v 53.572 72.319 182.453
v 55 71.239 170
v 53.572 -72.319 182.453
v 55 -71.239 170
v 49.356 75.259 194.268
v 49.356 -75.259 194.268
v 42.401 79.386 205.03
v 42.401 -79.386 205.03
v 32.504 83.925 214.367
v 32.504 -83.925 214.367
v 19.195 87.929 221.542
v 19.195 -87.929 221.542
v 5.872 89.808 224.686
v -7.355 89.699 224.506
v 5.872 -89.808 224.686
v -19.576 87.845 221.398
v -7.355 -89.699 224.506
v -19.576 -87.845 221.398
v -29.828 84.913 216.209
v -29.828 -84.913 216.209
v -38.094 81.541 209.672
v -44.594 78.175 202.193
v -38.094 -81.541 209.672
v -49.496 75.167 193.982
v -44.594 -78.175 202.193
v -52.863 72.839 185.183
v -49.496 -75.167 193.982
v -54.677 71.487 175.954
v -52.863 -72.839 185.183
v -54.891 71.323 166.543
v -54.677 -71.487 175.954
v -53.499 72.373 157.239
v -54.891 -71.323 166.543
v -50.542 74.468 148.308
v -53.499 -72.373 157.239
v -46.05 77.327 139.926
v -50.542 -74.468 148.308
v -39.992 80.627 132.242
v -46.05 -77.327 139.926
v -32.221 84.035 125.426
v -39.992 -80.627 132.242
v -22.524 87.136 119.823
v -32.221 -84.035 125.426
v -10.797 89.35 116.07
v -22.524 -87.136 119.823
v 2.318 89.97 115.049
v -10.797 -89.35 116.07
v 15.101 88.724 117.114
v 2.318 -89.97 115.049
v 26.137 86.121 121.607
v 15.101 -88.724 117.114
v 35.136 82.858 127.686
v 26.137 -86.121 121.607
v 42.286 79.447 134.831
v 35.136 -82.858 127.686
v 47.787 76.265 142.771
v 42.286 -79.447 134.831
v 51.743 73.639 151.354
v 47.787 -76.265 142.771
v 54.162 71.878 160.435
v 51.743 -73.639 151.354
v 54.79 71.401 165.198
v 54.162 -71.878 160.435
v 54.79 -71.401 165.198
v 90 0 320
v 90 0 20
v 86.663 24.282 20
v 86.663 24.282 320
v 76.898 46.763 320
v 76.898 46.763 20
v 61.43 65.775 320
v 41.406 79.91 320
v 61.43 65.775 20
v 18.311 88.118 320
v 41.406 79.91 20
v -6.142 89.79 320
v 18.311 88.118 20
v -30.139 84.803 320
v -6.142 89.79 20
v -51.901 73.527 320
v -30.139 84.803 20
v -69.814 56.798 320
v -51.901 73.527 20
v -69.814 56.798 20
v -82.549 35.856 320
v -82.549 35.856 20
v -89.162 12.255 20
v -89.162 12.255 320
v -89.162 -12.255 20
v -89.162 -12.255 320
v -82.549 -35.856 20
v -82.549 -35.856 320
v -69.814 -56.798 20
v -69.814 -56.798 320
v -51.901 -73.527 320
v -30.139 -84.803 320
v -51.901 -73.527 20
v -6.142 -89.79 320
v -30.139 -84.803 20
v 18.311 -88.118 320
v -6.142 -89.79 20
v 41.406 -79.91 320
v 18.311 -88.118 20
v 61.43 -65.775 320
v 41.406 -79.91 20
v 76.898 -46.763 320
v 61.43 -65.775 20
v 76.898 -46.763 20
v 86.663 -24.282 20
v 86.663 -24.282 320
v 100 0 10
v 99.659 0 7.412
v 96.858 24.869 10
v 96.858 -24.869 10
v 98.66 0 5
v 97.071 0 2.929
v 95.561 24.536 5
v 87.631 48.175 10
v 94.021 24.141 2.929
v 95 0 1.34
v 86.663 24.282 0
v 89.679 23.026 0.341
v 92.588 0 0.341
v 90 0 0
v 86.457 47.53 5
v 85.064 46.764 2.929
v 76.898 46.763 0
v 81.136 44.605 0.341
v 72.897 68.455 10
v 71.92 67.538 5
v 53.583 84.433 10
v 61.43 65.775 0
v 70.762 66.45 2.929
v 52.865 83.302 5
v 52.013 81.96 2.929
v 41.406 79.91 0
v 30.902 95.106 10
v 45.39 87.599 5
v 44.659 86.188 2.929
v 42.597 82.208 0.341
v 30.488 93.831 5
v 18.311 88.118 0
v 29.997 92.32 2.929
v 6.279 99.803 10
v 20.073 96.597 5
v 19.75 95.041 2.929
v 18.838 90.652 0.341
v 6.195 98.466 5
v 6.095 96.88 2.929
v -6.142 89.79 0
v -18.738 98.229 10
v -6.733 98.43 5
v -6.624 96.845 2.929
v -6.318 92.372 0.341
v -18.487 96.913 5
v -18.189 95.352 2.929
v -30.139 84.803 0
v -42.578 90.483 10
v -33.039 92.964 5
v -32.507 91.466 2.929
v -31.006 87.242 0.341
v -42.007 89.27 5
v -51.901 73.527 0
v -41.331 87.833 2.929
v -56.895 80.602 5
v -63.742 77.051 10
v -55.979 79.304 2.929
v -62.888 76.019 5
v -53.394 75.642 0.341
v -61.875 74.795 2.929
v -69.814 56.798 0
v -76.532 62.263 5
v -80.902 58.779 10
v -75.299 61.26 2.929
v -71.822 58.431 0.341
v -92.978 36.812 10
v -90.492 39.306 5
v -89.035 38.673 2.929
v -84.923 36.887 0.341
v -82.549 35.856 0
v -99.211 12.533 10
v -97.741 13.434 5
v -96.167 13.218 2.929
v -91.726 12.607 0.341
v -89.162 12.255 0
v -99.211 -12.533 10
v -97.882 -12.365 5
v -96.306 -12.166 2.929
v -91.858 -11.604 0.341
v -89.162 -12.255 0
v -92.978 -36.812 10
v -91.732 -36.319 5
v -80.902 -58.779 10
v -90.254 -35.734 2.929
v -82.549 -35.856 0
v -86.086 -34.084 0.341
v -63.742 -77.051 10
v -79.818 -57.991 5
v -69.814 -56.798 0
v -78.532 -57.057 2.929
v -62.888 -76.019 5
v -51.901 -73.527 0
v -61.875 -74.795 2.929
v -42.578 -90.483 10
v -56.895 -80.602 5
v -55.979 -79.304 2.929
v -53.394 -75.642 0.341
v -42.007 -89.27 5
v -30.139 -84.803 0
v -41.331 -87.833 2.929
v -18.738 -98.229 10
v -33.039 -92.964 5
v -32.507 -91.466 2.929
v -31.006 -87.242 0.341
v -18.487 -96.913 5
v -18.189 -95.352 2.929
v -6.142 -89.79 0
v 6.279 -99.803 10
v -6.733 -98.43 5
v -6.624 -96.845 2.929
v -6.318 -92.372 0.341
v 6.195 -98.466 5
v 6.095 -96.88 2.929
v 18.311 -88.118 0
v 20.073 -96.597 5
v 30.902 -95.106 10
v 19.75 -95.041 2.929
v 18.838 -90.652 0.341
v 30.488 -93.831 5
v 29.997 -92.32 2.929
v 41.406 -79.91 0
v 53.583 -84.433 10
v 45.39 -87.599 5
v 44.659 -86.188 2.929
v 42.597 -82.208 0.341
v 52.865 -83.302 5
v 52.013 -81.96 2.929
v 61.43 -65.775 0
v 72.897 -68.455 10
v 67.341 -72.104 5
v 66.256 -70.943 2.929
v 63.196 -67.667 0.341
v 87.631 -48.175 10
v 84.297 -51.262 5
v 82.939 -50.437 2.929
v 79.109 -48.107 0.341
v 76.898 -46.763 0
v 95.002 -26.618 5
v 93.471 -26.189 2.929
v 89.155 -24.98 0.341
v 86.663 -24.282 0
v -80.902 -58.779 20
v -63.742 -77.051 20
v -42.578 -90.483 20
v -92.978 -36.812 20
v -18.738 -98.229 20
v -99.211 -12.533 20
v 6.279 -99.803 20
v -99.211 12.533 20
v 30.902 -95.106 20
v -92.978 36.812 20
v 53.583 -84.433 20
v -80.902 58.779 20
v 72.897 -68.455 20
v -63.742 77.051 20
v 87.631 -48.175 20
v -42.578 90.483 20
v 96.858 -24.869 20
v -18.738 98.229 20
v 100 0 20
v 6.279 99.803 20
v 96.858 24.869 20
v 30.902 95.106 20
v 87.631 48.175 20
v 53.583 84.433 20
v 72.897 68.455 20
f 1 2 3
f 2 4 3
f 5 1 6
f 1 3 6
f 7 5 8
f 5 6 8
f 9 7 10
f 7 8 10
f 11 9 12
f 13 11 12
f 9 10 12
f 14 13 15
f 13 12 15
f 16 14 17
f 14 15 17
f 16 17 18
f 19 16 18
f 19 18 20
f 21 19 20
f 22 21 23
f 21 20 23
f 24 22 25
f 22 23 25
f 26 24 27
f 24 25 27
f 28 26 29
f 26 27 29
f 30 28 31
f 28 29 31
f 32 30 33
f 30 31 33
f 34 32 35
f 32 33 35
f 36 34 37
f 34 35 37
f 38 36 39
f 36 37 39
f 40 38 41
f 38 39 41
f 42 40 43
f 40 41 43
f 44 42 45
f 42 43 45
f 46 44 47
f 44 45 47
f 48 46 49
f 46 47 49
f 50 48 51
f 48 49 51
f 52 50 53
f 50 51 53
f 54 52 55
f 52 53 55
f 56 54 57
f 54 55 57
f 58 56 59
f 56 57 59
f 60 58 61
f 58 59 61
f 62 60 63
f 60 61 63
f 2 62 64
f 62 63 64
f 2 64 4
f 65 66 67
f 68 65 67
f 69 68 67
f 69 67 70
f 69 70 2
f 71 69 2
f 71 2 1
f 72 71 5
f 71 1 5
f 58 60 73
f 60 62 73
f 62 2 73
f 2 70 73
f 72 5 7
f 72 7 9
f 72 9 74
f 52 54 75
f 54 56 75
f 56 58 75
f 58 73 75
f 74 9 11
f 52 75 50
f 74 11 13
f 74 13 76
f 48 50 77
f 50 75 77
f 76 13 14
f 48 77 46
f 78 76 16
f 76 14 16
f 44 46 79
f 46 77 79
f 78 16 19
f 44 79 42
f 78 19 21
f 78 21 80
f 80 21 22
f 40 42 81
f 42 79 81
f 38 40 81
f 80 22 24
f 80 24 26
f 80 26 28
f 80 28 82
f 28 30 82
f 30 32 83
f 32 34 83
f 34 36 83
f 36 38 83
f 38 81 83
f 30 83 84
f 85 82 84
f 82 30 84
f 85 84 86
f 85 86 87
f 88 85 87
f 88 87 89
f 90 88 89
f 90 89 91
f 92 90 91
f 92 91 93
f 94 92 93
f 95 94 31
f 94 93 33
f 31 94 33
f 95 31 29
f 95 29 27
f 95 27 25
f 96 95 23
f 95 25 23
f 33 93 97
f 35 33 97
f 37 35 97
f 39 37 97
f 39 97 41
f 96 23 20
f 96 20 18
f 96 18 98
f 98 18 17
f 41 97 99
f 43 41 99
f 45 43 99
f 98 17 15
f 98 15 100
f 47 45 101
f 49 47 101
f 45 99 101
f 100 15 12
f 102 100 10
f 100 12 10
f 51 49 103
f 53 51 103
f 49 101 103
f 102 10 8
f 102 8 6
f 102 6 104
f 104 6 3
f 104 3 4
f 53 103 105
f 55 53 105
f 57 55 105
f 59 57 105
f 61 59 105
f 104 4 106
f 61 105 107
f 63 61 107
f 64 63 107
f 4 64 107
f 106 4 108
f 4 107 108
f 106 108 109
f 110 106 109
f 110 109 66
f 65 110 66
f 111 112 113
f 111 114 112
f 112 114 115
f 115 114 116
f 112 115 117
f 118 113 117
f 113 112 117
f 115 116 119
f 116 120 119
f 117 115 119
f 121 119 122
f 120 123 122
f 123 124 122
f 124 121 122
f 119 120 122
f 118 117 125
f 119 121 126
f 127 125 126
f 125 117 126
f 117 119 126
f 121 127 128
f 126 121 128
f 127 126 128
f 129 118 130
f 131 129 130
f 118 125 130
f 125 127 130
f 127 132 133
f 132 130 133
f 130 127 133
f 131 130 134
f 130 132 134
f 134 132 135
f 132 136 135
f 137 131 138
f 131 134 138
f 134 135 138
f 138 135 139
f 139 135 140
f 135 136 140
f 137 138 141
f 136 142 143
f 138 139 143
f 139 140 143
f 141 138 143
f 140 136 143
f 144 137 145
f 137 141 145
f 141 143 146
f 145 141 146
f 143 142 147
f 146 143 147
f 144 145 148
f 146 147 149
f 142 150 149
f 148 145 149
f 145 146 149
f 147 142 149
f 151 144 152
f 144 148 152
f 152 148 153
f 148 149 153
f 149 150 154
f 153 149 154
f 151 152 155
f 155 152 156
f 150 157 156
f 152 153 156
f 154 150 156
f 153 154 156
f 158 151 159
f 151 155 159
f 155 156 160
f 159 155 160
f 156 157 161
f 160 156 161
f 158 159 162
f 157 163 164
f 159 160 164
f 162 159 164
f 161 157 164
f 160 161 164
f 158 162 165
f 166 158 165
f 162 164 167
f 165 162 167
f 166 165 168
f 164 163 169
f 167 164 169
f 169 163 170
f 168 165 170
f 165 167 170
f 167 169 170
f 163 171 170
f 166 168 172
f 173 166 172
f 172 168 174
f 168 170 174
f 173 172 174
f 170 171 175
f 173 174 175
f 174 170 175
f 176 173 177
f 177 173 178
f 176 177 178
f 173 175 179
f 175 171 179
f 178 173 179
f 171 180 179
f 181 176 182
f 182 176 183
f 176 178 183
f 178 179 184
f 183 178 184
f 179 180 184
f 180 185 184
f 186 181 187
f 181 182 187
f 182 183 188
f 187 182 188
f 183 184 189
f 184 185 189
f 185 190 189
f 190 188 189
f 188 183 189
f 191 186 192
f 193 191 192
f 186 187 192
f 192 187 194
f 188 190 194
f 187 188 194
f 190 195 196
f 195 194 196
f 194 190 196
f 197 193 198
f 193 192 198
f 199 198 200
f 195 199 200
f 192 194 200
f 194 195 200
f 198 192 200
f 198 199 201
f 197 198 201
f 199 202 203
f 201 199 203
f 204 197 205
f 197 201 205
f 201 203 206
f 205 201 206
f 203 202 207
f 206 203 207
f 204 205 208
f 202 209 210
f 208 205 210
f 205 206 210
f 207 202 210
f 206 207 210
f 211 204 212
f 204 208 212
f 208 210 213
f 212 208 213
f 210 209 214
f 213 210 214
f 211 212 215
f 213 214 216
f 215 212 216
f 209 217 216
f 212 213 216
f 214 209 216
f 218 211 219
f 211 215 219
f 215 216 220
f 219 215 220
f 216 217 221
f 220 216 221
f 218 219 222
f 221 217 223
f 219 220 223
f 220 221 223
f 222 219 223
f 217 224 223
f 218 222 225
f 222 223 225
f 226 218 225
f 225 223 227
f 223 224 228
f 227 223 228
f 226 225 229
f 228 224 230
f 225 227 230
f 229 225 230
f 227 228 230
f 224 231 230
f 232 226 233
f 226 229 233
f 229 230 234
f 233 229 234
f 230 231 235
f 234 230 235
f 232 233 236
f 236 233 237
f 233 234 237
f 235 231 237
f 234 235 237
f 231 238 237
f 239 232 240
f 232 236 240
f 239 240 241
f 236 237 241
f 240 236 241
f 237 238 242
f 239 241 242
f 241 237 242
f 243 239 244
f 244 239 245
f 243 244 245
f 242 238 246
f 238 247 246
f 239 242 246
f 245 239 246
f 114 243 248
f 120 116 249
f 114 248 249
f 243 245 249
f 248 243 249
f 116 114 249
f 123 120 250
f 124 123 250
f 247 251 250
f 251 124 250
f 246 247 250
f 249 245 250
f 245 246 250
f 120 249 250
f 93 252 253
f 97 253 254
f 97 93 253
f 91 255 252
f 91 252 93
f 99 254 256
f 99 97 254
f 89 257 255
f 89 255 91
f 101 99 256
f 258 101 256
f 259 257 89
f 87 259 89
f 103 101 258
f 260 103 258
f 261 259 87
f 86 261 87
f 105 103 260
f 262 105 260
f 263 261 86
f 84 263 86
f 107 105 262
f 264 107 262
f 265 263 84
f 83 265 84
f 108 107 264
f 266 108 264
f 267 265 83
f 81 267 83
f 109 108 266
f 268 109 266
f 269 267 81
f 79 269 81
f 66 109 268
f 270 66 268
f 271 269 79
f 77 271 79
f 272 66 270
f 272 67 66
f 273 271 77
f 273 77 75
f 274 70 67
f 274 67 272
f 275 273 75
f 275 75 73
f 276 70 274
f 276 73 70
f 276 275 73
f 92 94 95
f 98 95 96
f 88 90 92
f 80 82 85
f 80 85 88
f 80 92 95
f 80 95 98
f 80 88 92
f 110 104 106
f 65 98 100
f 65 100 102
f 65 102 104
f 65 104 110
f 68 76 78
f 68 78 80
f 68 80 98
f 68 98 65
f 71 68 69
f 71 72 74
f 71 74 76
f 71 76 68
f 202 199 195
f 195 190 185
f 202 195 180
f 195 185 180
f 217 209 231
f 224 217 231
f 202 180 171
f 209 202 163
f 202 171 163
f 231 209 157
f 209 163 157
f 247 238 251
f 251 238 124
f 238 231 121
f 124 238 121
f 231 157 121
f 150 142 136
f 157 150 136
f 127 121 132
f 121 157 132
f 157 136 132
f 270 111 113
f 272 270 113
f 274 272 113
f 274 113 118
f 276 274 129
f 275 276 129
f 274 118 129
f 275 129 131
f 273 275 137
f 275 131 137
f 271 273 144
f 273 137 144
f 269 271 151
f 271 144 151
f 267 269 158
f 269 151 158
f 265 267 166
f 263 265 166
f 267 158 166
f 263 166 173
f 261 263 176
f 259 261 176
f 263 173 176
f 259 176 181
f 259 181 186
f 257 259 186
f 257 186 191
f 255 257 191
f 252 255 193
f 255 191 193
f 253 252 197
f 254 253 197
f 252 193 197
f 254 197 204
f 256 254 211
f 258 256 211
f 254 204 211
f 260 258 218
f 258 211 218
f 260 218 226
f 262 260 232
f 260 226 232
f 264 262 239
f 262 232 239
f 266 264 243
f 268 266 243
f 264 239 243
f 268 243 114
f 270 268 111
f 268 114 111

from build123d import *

# Parameters (mm, degrees)
F0_R     = 100
F0_R_2   = 90
F1_DEPTH = 20
F2_DEPTH = 320
F3_R     = 55
F4_DEPTH = 147
F5_R     = 10


with BuildPart() as f1:
    # F0 (on Top) → F1 (new body)
    with BuildSketch(Plane.XY):
        Circle(F0_R)
        Circle(F0_R_2, mode=Mode.SUBTRACT)
    extrude(amount=F1_DEPTH)

    # F0 (on Top) → F2 (join)
    with BuildSketch(Plane.XY):
        Circle(F0_R_2)
    extrude(amount=F2_DEPTH)

    # F3 (on Front) → F4 (cut, symmetric)
    with BuildSketch(Plane.XZ):
        with Locations((0, 170)):
            Circle(F3_R)
    extrude(amount=F4_DEPTH, both=True, mode=Mode.SUBTRACT)

    # F5
    f5_edges = [f1.edges().sort_by_distance(p)[0] for p in [
        (-100, 0, 0),
    ]]
    fillet(f5_edges, radius=F5_R)


solid = f1.part
